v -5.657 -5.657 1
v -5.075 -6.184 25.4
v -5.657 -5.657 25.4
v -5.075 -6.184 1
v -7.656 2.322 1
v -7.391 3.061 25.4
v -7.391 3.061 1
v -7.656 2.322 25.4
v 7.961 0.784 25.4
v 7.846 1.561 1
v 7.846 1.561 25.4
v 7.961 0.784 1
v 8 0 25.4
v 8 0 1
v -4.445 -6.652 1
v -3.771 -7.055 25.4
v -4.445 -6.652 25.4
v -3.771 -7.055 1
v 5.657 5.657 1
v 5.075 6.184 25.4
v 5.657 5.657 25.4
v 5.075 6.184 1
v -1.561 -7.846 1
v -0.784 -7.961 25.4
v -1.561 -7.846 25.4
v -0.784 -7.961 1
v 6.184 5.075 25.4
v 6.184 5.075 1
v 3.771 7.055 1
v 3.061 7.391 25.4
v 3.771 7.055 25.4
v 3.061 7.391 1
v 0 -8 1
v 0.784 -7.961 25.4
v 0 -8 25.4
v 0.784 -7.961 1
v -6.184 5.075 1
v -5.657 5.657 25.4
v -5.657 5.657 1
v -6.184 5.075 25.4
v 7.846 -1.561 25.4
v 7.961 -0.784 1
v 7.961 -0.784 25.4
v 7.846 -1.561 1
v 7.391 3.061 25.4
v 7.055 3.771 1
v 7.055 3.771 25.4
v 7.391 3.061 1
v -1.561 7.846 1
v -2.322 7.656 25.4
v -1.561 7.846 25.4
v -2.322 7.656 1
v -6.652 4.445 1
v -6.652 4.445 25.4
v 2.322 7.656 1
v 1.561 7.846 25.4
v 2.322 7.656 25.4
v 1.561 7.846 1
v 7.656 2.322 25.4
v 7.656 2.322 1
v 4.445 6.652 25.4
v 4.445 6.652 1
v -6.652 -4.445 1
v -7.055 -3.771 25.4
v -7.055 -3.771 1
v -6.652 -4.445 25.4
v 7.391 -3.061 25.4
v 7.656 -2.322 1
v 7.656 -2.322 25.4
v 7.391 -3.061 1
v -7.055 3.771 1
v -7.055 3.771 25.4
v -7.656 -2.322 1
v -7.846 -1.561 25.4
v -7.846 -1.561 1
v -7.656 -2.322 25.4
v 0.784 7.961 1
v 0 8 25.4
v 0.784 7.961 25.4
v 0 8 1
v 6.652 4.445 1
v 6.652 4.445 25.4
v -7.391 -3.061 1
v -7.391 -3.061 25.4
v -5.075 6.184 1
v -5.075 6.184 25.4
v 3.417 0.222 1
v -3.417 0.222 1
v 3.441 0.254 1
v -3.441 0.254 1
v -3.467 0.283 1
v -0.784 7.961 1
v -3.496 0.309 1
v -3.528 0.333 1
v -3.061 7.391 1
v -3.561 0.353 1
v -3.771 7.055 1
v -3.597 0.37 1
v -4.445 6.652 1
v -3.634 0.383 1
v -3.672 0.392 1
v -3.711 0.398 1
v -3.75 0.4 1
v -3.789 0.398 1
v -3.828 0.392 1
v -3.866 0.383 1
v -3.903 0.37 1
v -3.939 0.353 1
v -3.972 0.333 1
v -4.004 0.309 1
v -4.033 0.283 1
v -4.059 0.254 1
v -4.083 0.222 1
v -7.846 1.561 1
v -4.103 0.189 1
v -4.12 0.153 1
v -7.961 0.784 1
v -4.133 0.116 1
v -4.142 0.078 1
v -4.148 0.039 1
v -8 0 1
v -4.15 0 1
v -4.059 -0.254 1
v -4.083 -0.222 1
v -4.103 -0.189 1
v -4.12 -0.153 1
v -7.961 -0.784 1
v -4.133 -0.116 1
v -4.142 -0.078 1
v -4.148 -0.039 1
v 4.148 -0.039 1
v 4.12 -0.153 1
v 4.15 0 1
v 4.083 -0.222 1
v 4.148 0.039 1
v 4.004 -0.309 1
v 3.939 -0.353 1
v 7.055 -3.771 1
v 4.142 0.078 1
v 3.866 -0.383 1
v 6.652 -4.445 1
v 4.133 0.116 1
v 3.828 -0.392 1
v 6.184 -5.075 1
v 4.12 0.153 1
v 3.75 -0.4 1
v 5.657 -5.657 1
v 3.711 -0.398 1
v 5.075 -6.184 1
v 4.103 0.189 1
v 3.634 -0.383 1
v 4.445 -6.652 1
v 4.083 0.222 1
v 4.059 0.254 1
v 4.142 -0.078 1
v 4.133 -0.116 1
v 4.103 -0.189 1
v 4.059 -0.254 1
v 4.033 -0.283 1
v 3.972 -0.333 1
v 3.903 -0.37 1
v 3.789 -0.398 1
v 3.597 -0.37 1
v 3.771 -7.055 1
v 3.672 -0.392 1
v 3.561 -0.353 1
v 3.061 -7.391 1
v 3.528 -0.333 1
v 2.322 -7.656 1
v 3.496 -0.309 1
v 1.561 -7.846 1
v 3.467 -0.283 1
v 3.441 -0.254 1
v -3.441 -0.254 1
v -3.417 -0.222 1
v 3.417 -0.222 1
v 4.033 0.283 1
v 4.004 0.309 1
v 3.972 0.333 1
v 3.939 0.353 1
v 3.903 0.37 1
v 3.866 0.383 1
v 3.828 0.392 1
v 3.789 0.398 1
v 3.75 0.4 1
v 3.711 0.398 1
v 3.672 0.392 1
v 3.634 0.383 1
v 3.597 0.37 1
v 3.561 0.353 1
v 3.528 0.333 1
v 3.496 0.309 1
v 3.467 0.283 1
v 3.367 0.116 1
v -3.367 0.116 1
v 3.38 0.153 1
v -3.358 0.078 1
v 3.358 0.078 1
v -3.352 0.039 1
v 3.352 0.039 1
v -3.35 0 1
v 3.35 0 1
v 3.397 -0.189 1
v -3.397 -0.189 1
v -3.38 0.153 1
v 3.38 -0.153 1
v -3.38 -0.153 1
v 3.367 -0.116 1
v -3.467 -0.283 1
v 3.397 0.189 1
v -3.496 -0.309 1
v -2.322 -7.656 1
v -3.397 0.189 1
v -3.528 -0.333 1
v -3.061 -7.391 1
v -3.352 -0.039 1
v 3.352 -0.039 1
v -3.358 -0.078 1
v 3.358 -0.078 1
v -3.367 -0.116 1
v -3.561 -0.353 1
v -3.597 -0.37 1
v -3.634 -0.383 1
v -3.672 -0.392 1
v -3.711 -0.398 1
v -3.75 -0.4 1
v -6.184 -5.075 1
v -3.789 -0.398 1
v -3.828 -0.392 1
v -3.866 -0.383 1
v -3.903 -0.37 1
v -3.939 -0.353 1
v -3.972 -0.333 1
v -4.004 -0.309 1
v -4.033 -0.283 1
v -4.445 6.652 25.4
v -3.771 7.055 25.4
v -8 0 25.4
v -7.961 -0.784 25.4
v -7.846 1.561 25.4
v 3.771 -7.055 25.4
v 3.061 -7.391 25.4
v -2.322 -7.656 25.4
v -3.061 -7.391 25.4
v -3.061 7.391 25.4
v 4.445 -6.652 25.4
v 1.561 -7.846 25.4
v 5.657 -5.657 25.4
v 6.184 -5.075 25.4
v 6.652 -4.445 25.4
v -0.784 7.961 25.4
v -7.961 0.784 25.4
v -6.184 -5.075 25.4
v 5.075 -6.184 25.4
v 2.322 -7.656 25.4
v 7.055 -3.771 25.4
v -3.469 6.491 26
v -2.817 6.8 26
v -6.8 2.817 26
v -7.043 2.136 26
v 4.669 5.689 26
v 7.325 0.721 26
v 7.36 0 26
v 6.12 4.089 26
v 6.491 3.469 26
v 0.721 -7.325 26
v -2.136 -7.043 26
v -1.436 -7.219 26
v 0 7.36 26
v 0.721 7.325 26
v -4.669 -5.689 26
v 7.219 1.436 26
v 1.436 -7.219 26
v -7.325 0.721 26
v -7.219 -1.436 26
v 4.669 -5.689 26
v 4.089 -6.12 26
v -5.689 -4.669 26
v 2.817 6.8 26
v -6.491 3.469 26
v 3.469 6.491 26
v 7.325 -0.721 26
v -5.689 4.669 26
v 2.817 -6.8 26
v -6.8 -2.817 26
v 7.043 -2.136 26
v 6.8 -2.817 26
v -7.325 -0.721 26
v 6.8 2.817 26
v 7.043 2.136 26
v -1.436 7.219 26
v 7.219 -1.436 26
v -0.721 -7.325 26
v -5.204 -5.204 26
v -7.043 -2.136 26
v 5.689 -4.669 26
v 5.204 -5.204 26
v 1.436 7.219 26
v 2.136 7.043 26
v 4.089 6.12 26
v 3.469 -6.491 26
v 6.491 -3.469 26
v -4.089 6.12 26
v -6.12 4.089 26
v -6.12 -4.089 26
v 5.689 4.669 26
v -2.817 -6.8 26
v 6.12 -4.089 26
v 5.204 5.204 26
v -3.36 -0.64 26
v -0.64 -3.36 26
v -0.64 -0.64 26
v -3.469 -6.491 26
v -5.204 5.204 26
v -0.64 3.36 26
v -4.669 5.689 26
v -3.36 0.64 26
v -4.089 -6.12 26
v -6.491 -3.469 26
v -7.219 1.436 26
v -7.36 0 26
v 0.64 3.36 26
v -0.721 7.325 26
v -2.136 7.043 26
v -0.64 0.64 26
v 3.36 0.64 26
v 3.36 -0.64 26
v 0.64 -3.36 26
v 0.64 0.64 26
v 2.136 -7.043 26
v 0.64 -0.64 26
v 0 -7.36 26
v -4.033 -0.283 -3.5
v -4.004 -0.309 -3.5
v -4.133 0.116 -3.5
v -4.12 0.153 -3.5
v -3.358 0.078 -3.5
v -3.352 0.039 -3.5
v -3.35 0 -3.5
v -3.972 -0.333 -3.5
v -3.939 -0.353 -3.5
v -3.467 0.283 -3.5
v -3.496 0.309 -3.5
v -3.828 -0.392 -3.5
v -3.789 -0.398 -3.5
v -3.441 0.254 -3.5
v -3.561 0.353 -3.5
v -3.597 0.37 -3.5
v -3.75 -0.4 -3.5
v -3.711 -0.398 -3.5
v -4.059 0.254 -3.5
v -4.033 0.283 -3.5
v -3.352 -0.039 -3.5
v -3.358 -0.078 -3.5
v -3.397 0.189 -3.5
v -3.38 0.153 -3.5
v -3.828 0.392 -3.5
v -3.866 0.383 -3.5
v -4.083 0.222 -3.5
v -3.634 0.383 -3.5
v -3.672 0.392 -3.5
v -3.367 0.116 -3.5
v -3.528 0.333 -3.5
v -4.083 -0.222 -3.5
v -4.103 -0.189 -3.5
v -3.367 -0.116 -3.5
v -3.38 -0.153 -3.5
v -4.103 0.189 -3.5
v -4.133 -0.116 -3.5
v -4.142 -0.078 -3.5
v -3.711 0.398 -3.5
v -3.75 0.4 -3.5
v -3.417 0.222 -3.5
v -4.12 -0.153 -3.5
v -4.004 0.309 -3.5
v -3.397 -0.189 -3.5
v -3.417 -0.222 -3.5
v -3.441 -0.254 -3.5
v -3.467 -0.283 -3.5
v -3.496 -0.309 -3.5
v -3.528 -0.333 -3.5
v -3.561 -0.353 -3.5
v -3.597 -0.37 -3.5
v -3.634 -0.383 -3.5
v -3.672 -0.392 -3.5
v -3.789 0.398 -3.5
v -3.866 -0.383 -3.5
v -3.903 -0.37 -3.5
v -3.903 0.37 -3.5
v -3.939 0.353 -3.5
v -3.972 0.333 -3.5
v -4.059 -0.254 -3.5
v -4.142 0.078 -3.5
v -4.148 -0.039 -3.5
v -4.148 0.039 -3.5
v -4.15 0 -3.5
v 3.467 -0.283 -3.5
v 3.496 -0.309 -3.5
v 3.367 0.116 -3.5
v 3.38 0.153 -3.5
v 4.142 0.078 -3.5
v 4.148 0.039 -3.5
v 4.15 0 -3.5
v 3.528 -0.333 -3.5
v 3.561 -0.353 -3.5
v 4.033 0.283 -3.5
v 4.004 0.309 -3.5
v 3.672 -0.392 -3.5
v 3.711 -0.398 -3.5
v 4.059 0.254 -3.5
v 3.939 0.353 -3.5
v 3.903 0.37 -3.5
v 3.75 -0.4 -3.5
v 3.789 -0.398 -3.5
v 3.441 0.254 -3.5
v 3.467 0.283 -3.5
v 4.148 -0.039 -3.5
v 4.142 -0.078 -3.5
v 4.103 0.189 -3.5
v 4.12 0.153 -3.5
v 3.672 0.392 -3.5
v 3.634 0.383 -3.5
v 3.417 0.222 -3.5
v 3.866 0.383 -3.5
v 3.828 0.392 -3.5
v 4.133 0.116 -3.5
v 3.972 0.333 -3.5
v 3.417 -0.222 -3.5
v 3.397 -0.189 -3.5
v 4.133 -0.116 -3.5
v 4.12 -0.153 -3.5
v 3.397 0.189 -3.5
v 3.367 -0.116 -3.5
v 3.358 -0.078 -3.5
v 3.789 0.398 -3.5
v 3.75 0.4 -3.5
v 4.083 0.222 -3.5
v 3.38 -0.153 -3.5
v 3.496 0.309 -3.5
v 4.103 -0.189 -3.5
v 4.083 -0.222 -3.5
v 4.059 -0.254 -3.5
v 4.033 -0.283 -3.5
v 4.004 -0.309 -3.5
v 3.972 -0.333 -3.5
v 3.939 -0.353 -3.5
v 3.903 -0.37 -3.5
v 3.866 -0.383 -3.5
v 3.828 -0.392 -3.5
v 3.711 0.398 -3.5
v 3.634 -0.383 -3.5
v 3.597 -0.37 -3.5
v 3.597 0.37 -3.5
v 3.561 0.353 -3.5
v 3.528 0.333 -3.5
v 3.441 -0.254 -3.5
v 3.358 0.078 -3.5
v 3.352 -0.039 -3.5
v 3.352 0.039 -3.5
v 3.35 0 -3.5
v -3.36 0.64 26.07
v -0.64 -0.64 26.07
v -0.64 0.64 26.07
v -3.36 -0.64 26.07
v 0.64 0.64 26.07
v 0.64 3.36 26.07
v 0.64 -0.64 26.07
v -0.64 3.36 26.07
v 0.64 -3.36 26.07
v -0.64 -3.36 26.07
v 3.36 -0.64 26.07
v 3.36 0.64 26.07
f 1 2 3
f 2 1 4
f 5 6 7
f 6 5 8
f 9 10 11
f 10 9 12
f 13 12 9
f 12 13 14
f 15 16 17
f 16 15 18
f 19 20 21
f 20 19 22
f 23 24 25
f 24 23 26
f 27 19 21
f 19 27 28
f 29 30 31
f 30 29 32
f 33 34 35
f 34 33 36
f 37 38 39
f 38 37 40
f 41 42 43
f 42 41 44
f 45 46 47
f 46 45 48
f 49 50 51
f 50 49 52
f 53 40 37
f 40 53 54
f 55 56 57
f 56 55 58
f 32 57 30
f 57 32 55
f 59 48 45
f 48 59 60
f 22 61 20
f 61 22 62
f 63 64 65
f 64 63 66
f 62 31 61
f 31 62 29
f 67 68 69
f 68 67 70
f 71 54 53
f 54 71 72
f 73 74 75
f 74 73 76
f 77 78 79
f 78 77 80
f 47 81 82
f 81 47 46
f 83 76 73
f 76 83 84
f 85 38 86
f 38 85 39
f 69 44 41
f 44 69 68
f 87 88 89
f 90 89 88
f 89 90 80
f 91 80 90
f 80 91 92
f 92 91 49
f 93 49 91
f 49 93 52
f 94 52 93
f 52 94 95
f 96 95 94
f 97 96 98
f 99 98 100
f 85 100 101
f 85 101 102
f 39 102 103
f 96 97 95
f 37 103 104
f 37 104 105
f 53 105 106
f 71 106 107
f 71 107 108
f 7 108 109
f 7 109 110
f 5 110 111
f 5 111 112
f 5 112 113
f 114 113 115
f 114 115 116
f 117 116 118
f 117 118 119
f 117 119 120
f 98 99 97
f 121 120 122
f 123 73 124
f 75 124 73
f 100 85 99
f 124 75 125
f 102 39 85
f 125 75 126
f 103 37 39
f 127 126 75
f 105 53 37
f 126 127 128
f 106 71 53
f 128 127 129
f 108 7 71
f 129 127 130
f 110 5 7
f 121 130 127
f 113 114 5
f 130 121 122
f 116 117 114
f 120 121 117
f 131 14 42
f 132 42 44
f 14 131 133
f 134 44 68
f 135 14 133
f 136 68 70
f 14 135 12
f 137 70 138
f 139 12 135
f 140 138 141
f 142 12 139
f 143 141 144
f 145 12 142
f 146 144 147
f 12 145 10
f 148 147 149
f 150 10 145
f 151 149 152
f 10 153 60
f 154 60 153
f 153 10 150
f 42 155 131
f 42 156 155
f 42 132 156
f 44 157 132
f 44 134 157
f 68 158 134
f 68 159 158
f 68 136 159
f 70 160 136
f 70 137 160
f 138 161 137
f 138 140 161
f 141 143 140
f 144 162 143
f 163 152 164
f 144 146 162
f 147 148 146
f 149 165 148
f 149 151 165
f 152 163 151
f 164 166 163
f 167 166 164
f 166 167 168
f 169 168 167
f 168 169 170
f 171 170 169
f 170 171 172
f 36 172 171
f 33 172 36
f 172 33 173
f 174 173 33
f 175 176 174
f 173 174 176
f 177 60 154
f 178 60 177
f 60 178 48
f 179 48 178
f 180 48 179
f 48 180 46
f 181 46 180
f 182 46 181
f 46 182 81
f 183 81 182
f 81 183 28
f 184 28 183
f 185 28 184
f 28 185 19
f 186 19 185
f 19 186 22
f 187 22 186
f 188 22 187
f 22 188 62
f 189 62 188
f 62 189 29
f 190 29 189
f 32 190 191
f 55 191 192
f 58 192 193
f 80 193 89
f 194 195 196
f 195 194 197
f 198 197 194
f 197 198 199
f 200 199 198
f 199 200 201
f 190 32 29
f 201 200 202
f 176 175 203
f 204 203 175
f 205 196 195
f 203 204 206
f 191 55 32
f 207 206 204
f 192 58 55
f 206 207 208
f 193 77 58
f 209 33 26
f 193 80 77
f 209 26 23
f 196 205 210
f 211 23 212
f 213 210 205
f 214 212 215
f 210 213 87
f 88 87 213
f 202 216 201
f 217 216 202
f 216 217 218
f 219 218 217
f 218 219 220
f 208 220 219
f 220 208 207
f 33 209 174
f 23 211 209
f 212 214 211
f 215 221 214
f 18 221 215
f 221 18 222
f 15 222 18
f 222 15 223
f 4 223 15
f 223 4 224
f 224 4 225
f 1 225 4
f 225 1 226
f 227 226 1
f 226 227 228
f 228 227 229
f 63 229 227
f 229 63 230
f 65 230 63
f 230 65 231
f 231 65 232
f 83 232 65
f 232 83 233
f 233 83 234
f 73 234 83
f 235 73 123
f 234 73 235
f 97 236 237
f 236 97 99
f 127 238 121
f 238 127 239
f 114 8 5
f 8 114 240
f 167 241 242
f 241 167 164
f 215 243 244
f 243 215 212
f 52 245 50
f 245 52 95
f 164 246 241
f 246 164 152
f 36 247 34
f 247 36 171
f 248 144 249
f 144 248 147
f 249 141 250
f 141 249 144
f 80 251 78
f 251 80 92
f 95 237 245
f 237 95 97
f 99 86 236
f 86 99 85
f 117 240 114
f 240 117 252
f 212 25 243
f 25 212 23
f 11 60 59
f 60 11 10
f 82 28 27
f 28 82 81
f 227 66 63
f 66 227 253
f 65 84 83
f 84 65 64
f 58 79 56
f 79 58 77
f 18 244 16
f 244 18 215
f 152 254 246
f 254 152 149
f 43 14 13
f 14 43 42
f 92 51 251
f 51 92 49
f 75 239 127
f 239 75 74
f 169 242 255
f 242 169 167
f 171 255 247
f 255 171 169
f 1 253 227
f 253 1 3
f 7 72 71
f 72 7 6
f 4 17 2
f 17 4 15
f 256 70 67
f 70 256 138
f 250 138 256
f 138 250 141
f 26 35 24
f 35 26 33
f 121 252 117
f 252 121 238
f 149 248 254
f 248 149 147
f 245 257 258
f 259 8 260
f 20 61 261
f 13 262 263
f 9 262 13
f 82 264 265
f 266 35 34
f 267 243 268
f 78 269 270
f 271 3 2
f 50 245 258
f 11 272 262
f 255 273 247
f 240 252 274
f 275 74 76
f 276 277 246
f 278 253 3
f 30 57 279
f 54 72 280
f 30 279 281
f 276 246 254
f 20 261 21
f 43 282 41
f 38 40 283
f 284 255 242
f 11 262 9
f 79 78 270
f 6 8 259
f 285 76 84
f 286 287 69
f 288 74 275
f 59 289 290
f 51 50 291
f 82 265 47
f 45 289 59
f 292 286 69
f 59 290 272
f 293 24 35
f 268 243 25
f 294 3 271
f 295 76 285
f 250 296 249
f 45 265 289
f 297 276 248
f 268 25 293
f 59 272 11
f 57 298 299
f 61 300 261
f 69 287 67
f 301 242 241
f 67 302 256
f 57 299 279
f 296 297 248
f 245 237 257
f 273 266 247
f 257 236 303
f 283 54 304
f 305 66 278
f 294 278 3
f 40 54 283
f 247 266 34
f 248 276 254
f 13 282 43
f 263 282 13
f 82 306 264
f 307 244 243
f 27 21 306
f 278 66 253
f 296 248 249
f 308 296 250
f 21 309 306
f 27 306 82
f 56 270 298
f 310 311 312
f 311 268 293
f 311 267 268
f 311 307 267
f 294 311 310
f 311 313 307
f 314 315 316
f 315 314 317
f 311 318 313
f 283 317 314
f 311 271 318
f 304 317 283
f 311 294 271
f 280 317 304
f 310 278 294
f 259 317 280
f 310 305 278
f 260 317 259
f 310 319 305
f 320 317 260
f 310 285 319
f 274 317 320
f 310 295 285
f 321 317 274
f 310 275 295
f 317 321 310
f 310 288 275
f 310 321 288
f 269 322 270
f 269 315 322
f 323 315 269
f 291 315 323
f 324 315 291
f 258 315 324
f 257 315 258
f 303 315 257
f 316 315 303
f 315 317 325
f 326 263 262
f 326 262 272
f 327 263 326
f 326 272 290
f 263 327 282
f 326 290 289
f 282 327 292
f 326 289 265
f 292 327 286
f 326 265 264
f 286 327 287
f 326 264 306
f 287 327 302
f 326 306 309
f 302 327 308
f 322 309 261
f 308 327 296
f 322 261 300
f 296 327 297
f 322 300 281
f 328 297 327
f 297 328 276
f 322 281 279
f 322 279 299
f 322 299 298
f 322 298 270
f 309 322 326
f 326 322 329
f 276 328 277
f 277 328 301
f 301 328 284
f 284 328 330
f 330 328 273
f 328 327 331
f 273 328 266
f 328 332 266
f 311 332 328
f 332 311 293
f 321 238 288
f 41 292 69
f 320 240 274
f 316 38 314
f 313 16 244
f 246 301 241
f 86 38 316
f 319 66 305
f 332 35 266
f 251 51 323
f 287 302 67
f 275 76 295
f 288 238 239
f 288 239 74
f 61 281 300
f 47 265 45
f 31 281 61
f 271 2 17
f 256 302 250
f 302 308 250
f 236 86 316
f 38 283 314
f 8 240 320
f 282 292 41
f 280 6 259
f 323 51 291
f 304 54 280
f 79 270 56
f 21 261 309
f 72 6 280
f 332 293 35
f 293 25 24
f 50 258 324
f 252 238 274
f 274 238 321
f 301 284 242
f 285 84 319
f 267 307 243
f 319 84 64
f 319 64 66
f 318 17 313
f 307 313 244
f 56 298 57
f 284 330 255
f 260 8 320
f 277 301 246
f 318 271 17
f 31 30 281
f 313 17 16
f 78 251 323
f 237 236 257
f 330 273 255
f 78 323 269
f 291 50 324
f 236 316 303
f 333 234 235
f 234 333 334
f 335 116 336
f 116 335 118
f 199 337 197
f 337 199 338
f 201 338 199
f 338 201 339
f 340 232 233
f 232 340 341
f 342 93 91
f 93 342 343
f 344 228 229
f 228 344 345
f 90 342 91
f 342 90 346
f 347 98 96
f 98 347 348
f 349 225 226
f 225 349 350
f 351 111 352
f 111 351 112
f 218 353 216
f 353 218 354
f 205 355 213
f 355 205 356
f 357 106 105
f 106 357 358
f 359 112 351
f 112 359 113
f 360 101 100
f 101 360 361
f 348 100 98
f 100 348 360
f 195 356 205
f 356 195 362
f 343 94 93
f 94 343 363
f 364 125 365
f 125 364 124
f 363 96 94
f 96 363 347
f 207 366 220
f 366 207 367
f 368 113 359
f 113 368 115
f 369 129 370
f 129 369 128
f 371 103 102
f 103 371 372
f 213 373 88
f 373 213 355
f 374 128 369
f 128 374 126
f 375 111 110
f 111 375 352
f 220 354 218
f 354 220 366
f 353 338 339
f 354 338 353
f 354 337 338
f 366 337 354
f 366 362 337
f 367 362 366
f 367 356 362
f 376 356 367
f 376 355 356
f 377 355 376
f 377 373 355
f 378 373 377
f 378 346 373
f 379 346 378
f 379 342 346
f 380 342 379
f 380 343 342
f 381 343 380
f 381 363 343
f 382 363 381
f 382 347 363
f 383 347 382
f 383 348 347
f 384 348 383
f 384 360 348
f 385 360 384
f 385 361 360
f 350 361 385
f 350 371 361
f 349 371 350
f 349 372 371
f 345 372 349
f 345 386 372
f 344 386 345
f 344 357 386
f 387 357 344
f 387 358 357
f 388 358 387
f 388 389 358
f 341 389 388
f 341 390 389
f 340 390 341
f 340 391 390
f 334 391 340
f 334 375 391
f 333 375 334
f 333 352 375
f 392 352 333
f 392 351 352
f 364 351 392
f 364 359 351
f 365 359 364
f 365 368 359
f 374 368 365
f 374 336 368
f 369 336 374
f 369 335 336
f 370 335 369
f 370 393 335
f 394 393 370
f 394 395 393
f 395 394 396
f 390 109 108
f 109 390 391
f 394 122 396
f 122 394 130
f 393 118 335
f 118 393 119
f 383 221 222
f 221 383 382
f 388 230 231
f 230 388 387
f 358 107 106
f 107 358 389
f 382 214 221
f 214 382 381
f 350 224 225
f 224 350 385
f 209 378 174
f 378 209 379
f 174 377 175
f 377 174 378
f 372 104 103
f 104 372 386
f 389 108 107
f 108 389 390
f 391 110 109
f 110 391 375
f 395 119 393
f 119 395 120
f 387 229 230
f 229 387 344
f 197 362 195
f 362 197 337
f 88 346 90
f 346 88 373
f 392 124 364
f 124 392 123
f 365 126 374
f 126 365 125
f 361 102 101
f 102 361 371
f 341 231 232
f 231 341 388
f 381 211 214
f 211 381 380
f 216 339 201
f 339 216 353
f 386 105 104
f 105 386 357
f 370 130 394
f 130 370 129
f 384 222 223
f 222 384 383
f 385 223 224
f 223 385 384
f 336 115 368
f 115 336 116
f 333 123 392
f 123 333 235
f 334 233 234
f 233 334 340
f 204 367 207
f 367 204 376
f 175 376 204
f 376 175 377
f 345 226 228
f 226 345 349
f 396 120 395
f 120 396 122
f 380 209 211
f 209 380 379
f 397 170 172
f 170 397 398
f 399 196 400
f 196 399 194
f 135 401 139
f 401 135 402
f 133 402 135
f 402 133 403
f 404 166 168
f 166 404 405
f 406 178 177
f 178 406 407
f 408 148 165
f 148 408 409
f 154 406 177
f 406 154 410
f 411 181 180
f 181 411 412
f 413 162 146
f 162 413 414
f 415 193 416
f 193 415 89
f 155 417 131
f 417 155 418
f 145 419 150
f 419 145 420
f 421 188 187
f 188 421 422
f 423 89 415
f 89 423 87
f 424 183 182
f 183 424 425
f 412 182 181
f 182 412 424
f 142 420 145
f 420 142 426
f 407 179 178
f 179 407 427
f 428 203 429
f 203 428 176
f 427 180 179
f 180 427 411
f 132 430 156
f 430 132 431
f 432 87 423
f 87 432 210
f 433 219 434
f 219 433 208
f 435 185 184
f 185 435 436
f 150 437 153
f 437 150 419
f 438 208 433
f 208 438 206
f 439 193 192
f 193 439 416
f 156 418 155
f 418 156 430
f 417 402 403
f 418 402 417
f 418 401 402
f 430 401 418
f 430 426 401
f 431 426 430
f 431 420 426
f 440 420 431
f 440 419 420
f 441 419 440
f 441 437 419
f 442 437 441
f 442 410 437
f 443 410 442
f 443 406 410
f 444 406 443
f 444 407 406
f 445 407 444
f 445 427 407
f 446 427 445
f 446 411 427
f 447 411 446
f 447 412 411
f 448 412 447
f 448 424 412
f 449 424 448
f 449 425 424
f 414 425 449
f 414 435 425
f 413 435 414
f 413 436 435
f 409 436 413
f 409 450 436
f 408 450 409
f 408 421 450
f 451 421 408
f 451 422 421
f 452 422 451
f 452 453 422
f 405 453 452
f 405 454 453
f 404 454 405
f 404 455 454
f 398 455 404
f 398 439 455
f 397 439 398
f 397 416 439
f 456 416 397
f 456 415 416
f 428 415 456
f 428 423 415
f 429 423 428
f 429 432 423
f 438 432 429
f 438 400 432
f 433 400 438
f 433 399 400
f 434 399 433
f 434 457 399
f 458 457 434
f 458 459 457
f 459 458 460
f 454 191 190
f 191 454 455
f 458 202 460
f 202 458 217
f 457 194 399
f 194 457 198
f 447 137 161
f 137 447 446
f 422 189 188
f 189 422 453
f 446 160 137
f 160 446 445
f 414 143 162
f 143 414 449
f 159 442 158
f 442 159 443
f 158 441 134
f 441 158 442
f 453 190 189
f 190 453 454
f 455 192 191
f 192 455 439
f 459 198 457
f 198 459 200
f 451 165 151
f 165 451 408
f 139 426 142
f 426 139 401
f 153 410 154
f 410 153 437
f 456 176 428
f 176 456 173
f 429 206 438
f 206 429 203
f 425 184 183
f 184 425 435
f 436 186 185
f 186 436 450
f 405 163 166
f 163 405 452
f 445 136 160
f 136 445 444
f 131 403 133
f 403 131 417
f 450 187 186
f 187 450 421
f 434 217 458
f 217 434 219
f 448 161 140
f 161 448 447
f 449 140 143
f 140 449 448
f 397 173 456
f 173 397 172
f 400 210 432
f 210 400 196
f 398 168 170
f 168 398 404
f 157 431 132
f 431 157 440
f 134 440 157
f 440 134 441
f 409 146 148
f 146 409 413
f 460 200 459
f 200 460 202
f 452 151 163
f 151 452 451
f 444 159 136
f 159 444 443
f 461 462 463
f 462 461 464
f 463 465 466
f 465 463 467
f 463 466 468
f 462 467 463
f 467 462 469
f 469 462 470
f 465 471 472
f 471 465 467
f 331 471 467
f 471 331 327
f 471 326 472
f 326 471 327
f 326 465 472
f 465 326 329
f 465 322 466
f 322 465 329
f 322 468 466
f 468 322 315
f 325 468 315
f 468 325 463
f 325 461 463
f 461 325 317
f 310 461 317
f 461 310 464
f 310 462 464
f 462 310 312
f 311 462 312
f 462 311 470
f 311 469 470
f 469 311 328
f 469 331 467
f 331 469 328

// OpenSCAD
$fn = 64;

body_diameter = 16;
body_height = 25;
lead_spacing = 7.5;
lead_diameter = 0.8;
lead_length_below = 3.5;
body_lift = 1;
lead_stub = 1;
top_chamfer = 0.6;

module lead(x) {
    color([0.75, 0.75, 0.75])
    translate([x, 0, -lead_length_below])
        cylinder(h = lead_length_below + body_lift + lead_stub, d = lead_diameter);
}

module capacitor_body() {
    color([0.16, 0.18, 0.19])
    union() {
        translate([0, 0, body_lift])
            cylinder(h = body_height - top_chamfer, d = body_diameter);
        translate([0, 0, body_lift + body_height - top_chamfer])
            cylinder(h = top_chamfer, d1 = body_diameter, d2 = body_diameter * 0.92);
    }
}

module top_vent() {
    color([0.78, 0.78, 0.78])
    translate([0, 0, body_lift + body_height - 0.05])
    linear_extrude(height = 0.12)
    union() {
        square([body_diameter * 0.42, body_diameter * 0.08], center = true);
        square([body_diameter * 0.08, body_diameter * 0.42], center = true);
    }
}

lead(-lead_spacing / 2);
lead( lead_spacing / 2);
capacitor_body();
top_vent();
